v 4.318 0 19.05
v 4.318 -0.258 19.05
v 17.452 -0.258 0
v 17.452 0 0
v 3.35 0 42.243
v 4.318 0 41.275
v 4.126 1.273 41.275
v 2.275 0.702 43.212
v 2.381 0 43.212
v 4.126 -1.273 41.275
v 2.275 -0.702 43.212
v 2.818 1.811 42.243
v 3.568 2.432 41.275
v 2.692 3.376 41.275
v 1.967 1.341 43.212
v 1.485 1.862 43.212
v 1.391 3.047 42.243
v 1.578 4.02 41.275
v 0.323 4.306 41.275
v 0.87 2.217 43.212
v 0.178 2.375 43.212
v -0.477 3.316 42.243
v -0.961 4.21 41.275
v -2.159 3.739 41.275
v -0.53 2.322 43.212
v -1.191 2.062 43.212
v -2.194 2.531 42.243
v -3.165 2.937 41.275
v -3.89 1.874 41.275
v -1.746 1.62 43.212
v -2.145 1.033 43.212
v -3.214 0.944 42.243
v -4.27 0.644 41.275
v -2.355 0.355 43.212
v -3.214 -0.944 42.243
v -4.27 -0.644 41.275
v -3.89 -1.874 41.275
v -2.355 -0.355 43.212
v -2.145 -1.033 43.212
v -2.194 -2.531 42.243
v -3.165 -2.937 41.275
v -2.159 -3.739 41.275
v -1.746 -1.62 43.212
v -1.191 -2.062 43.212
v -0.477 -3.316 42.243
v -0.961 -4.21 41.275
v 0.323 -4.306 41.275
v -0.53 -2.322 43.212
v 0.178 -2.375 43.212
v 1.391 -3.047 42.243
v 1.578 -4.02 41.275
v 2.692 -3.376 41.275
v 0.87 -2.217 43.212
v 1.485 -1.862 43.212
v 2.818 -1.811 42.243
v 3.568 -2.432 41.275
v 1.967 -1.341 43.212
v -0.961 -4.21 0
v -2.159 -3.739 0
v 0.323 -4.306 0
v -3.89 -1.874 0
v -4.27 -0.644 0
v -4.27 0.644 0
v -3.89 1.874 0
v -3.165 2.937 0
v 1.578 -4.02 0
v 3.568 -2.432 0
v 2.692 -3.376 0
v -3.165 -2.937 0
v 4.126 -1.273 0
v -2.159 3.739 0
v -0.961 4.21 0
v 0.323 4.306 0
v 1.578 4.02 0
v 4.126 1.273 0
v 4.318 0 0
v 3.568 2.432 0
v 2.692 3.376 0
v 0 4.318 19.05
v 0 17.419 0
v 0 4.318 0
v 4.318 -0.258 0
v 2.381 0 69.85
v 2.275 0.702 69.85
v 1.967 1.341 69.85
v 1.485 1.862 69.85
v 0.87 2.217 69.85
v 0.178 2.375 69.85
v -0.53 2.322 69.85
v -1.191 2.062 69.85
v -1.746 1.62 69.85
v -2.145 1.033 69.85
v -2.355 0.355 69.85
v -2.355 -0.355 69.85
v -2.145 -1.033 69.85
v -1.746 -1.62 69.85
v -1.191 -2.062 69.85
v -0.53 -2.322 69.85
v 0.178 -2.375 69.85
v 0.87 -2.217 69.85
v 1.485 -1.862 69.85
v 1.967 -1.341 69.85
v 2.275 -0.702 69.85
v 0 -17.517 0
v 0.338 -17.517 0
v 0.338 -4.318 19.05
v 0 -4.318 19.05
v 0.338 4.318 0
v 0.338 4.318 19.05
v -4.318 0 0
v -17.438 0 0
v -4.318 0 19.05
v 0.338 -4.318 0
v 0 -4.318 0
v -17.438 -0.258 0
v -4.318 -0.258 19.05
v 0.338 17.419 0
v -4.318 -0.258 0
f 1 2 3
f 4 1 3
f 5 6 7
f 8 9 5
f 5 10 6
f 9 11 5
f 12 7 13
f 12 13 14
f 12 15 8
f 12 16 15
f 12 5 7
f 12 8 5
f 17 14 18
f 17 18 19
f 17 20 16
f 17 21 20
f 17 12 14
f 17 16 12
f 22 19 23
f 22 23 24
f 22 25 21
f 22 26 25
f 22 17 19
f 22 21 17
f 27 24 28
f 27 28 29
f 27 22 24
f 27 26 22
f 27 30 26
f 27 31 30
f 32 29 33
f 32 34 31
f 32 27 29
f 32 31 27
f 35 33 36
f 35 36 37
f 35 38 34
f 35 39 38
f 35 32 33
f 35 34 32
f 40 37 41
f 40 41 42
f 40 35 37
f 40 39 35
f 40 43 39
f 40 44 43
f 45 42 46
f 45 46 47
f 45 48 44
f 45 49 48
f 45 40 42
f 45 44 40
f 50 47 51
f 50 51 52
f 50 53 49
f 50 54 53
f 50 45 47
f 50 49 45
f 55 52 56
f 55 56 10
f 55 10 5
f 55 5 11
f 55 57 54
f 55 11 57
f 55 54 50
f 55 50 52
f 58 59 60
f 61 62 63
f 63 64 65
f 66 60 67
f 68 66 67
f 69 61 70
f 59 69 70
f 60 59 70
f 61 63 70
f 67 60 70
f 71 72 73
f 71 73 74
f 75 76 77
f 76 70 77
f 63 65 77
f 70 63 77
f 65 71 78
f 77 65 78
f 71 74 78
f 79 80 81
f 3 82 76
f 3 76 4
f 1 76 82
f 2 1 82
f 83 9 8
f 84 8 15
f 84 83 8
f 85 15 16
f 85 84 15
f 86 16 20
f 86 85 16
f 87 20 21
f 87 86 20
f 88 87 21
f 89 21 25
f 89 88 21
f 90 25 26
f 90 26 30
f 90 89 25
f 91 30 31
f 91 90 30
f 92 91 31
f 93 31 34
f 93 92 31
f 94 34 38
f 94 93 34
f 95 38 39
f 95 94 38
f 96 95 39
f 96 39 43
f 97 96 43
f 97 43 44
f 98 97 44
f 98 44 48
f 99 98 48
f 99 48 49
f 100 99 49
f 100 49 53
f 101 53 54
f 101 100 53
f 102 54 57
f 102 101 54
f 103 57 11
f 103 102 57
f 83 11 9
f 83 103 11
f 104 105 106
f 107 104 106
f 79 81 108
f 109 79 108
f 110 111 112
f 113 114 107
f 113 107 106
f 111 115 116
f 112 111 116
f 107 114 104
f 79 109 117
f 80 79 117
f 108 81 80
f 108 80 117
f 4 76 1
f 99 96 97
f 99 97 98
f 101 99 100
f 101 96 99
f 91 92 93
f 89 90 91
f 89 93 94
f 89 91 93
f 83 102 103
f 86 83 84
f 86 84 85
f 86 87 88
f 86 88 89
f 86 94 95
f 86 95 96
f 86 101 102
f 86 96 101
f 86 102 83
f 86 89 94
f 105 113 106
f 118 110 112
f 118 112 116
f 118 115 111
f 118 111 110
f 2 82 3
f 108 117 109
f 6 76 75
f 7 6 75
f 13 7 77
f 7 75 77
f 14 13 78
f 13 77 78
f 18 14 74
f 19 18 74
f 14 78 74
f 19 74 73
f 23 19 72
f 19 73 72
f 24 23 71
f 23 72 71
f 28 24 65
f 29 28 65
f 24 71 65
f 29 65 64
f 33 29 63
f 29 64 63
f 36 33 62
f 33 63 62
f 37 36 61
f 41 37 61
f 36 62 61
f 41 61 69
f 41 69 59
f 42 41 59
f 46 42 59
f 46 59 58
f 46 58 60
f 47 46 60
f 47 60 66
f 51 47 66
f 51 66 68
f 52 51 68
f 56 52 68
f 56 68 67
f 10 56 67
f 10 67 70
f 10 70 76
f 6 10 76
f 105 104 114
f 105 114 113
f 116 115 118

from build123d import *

# Parameters (mm, degrees)
F0_R        = 4.318
F1_DEPTH    = 44.45
F2_R        = 2.38125
F3_DEPTH    = 25.4
F4_S5_R     = 2.38125
F4_T6_DEPTH = 8
F5_W        = 0.3382458817
F5_H        = 13.1992071904
F6_DEPTH    = 19.05
F5_W_2      = 13.1341543086
F5_H_2      = 0.257695443
F5_H_3      = 13.1008949168
F5_W_3      = 13.120493669
F8_DEPTH    = 25.4
F10_DEPTH   = 25.4
F12_DEPTH   = 25.4
F14_DEPTH   = 25.4


# Not quite as in the source:
# - a fillet or chamfer that OpenCascade refuses, or shapes differently, is made with other operations: its cross-section is extruded or revolved along the edge and cut away or added


with BuildPart() as f1:
    # F0 (on Top) → F1 (new body)
    with BuildSketch(Plane.XY):
        Circle(F0_R)
    extrude(amount=F1_DEPTH)

    # F2 (on face) → F3 (join)
    with BuildSketch(Plane.XY.offset(44.45)):
        Circle(F2_R)
    extrude(amount=F3_DEPTH)

    # F4: chamfer of 3.175 on 1 edges, made by hand


with BuildPart() as f4_tool2:
    # F4_s3 → F4_t4 (revolve)
    with BuildSketch(Plane.XZ):
        Polygon((4.318, 41.275), (1.143, 44.45), (4.318, 44.45), align=None)
    revolve(axis=Axis((0, 0, 44.45), (0, 0, 1)))

    # F4_s5 → F4_t6 (cut, symmetric)
    with BuildSketch(Plane.XY.offset(42.9)):
        Circle(F4_S5_R)
    extrude(amount=F4_T6_DEPTH, both=True, mode=Mode.SUBTRACT)


with BuildPart() as f1_1:
    add(f1.part)

    # F4_t1: cut F4_tool2
    add(f4_tool2.part, mode=Mode.SUBTRACT)


with BuildPart() as f6:
    # F5 (on face) → F6 (new body)
    with BuildSketch(Plane(origin=(0, 0, 0), x_dir=(1, 0, 0), z_dir=(0, 0, -1))):
        with Locations((0.1691229409, 10.9176035952)):
            Rectangle(F5_W, F5_H)
    extrude(amount=-F6_DEPTH)

    # F7 (on face) → F8 (cut)
    with BuildSketch(Plane.YZ.offset(0.3382458817)):
        Polygon((-17.5172071904, 0), (-4.318, 19.05), (-17.5172071904, 19.05), align=None)
    extrude(amount=-F8_DEPTH, mode=Mode.SUBTRACT)


with BuildPart() as f6b:
    # F5 (on face) → F6, piece 2 (new body)
    with BuildSketch(Plane(origin=(0, 0, 0), x_dir=(1, 0, 0), z_dir=(0, 0, -1))):
        with Locations((10.8850771543, 0.1288477215)):
            Rectangle(F5_W_2, F5_H_2)
    extrude(amount=-F6_DEPTH)

    # F11 (on face) → F12 (cut)
    with BuildSketch(Plane.XZ.offset(0.257695443)):
        Polygon((17.4521543086, 19.05), (4.318, 19.05), (17.4521543086, 0), align=None)
    extrude(amount=-F12_DEPTH, mode=Mode.SUBTRACT)


with BuildPart() as f6c:
    # F5 (on face) → F6, piece 3 (new body)
    with BuildSketch(Plane(origin=(0, 0, 0), x_dir=(1, 0, 0), z_dir=(0, 0, -1))):
        with Locations((0.1691229409, -10.8684474584)):
            Rectangle(F5_W, F5_H_3)
    extrude(amount=-F6_DEPTH)

    # F9 (on face) → F10 (cut)
    with BuildSketch(Plane.YZ.offset(0.3382458817)):
        Polygon((17.4188949168, 19.05), (4.318, 19.05), (17.4188949168, 0), align=None)
    extrude(amount=-F10_DEPTH, mode=Mode.SUBTRACT)


with BuildPart() as f6d:
    # F5 (on face) → F6, piece 4 (new body)
    with BuildSketch(Plane(origin=(0, 0, 0), x_dir=(1, 0, 0), z_dir=(0, 0, -1))):
        with Locations((-10.8782468345, 0.1288477215)):
            Rectangle(F5_W_3, F5_H_2)
    extrude(amount=-F6_DEPTH)

    # F13 (on face) → F14 (cut)
    with BuildSketch(Plane.XZ.offset(0.257695443)):
        Polygon((-17.438493669, 0), (-4.318, 19.05), (-17.438493669, 19.05), align=None)
    extrude(amount=-F14_DEPTH, mode=Mode.SUBTRACT)


solid = Compound([f1_1.part, f6.part, f6b.part, f6c.part, f6d.part])
